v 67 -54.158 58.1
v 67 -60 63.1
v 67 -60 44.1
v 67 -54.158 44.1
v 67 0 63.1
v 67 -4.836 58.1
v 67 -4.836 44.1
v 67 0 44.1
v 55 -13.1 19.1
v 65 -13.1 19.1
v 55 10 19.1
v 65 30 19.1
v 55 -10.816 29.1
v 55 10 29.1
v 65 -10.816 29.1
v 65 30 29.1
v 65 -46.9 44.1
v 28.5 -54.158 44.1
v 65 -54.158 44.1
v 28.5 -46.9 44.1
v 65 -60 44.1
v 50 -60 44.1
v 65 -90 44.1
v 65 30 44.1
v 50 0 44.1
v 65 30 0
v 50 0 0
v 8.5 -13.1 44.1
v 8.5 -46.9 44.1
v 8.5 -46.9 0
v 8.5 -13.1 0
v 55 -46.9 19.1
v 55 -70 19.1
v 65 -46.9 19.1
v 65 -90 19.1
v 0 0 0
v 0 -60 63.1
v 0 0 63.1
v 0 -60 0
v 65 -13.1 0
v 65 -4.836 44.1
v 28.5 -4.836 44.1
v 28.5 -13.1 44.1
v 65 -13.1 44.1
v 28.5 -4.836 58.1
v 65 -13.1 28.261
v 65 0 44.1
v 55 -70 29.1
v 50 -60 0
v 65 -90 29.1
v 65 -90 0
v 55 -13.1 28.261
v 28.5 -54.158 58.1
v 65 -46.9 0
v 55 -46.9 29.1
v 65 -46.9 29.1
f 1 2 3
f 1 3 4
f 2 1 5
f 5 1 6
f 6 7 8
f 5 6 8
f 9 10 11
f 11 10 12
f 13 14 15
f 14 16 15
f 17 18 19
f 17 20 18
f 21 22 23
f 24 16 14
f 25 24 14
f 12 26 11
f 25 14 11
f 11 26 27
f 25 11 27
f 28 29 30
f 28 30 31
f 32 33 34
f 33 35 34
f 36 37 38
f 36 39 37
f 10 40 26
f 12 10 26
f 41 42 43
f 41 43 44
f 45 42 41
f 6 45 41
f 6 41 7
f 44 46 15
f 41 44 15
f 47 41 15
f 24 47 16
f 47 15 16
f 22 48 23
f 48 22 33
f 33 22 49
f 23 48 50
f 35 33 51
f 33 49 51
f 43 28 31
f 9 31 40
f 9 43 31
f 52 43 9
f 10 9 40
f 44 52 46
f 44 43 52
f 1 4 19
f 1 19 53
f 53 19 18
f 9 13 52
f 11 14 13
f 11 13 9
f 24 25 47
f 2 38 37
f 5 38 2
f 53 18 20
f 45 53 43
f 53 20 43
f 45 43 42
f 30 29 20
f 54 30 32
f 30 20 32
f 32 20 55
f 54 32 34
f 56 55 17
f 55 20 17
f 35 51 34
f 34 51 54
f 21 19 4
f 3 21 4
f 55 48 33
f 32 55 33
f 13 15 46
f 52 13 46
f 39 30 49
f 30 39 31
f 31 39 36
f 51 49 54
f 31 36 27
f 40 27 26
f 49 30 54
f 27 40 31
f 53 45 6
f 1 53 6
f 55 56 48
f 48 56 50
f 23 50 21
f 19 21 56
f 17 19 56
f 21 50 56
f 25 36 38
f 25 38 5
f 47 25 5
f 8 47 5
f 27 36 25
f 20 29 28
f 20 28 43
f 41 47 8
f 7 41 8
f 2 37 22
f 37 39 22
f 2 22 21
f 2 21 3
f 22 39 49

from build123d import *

# Parameters (mm, degrees)
SKETCH_1_W          = 50
SKETCH_1_H          = 60
EXTRUDE_1_DEPTH     = 44.1
SKETCH_2_W          = 113
SKETCH_2_H          = 33.8
CUT_EXTRUDE_1_DEPTH = 120.456310005
CUT_EXTRUDE_2_DEPTH = 10
EXTRUDE_2_DEPTH     = 14
SKETCH_5_W          = 67
SKETCH_5_H          = 60
EXTRUDE_3_DEPTH     = 5


with BuildPart() as part:
    # 草图1 → 凸台-拉伸1 (new body)
    with BuildSketch(Plane.XY):
        with Locations((25, -30)):
            Rectangle(SKETCH_1_W, SKETCH_1_H)
        Polygon((50, 0), (50, -30), (65, -30), (65, 30), align=None)
        Polygon((65, -30), (50, -30), (50, -60), (65, -90), align=None)
    extrude(amount=EXTRUDE_1_DEPTH)

    # 草图2 → 切除-拉伸1 (cut, through all)
    with BuildSketch(Plane.XY.offset(44.1)):
        with Locations((65, -30)):
            Rectangle(SKETCH_2_W, SKETCH_2_H)
    extrude(amount=-CUT_EXTRUDE_1_DEPTH, mode=Mode.SUBTRACT)

    # 草图3 → 切除-拉伸2 (cut)
    with BuildSketch(Plane(origin=(65, 0, 0), x_dir=(0, 0, -1), z_dir=(1, 0, 0))):
        Polygon((-19.1, -38.027210884), (-28.26075, -13.1), (-29.1, -13.1), (-29.1, -90), (-19.1, -90), align=None)
        Polygon((-29.1, 30), (-29.1, -10.816326531), (-28.26075, -13.1), (-19.1, -13.1), (-19.1, 30), align=None)
    extrude(amount=-CUT_EXTRUDE_2_DEPTH, mode=Mode.SUBTRACT)

    # 草图4 → 凸台-拉伸2 (add)
    with BuildSketch(Plane.XY.offset(44.1)):
        Polygon((0, 0), (0, -60), (67, -60), (67, -54.158468487), (28.5, -54.158468487), (28.5, -4.836475325), (67, -4.836475325), (67, 0), align=None)
    extrude(amount=EXTRUDE_2_DEPTH)

    # 草图5 → 凸台-拉伸3 (add)
    with BuildSketch(Plane.XY.offset(58.1)):
        with Locations((33.5, -30)):
            Rectangle(SKETCH_5_W, SKETCH_5_H)
    extrude(amount=EXTRUDE_3_DEPTH)


solid = part.part
